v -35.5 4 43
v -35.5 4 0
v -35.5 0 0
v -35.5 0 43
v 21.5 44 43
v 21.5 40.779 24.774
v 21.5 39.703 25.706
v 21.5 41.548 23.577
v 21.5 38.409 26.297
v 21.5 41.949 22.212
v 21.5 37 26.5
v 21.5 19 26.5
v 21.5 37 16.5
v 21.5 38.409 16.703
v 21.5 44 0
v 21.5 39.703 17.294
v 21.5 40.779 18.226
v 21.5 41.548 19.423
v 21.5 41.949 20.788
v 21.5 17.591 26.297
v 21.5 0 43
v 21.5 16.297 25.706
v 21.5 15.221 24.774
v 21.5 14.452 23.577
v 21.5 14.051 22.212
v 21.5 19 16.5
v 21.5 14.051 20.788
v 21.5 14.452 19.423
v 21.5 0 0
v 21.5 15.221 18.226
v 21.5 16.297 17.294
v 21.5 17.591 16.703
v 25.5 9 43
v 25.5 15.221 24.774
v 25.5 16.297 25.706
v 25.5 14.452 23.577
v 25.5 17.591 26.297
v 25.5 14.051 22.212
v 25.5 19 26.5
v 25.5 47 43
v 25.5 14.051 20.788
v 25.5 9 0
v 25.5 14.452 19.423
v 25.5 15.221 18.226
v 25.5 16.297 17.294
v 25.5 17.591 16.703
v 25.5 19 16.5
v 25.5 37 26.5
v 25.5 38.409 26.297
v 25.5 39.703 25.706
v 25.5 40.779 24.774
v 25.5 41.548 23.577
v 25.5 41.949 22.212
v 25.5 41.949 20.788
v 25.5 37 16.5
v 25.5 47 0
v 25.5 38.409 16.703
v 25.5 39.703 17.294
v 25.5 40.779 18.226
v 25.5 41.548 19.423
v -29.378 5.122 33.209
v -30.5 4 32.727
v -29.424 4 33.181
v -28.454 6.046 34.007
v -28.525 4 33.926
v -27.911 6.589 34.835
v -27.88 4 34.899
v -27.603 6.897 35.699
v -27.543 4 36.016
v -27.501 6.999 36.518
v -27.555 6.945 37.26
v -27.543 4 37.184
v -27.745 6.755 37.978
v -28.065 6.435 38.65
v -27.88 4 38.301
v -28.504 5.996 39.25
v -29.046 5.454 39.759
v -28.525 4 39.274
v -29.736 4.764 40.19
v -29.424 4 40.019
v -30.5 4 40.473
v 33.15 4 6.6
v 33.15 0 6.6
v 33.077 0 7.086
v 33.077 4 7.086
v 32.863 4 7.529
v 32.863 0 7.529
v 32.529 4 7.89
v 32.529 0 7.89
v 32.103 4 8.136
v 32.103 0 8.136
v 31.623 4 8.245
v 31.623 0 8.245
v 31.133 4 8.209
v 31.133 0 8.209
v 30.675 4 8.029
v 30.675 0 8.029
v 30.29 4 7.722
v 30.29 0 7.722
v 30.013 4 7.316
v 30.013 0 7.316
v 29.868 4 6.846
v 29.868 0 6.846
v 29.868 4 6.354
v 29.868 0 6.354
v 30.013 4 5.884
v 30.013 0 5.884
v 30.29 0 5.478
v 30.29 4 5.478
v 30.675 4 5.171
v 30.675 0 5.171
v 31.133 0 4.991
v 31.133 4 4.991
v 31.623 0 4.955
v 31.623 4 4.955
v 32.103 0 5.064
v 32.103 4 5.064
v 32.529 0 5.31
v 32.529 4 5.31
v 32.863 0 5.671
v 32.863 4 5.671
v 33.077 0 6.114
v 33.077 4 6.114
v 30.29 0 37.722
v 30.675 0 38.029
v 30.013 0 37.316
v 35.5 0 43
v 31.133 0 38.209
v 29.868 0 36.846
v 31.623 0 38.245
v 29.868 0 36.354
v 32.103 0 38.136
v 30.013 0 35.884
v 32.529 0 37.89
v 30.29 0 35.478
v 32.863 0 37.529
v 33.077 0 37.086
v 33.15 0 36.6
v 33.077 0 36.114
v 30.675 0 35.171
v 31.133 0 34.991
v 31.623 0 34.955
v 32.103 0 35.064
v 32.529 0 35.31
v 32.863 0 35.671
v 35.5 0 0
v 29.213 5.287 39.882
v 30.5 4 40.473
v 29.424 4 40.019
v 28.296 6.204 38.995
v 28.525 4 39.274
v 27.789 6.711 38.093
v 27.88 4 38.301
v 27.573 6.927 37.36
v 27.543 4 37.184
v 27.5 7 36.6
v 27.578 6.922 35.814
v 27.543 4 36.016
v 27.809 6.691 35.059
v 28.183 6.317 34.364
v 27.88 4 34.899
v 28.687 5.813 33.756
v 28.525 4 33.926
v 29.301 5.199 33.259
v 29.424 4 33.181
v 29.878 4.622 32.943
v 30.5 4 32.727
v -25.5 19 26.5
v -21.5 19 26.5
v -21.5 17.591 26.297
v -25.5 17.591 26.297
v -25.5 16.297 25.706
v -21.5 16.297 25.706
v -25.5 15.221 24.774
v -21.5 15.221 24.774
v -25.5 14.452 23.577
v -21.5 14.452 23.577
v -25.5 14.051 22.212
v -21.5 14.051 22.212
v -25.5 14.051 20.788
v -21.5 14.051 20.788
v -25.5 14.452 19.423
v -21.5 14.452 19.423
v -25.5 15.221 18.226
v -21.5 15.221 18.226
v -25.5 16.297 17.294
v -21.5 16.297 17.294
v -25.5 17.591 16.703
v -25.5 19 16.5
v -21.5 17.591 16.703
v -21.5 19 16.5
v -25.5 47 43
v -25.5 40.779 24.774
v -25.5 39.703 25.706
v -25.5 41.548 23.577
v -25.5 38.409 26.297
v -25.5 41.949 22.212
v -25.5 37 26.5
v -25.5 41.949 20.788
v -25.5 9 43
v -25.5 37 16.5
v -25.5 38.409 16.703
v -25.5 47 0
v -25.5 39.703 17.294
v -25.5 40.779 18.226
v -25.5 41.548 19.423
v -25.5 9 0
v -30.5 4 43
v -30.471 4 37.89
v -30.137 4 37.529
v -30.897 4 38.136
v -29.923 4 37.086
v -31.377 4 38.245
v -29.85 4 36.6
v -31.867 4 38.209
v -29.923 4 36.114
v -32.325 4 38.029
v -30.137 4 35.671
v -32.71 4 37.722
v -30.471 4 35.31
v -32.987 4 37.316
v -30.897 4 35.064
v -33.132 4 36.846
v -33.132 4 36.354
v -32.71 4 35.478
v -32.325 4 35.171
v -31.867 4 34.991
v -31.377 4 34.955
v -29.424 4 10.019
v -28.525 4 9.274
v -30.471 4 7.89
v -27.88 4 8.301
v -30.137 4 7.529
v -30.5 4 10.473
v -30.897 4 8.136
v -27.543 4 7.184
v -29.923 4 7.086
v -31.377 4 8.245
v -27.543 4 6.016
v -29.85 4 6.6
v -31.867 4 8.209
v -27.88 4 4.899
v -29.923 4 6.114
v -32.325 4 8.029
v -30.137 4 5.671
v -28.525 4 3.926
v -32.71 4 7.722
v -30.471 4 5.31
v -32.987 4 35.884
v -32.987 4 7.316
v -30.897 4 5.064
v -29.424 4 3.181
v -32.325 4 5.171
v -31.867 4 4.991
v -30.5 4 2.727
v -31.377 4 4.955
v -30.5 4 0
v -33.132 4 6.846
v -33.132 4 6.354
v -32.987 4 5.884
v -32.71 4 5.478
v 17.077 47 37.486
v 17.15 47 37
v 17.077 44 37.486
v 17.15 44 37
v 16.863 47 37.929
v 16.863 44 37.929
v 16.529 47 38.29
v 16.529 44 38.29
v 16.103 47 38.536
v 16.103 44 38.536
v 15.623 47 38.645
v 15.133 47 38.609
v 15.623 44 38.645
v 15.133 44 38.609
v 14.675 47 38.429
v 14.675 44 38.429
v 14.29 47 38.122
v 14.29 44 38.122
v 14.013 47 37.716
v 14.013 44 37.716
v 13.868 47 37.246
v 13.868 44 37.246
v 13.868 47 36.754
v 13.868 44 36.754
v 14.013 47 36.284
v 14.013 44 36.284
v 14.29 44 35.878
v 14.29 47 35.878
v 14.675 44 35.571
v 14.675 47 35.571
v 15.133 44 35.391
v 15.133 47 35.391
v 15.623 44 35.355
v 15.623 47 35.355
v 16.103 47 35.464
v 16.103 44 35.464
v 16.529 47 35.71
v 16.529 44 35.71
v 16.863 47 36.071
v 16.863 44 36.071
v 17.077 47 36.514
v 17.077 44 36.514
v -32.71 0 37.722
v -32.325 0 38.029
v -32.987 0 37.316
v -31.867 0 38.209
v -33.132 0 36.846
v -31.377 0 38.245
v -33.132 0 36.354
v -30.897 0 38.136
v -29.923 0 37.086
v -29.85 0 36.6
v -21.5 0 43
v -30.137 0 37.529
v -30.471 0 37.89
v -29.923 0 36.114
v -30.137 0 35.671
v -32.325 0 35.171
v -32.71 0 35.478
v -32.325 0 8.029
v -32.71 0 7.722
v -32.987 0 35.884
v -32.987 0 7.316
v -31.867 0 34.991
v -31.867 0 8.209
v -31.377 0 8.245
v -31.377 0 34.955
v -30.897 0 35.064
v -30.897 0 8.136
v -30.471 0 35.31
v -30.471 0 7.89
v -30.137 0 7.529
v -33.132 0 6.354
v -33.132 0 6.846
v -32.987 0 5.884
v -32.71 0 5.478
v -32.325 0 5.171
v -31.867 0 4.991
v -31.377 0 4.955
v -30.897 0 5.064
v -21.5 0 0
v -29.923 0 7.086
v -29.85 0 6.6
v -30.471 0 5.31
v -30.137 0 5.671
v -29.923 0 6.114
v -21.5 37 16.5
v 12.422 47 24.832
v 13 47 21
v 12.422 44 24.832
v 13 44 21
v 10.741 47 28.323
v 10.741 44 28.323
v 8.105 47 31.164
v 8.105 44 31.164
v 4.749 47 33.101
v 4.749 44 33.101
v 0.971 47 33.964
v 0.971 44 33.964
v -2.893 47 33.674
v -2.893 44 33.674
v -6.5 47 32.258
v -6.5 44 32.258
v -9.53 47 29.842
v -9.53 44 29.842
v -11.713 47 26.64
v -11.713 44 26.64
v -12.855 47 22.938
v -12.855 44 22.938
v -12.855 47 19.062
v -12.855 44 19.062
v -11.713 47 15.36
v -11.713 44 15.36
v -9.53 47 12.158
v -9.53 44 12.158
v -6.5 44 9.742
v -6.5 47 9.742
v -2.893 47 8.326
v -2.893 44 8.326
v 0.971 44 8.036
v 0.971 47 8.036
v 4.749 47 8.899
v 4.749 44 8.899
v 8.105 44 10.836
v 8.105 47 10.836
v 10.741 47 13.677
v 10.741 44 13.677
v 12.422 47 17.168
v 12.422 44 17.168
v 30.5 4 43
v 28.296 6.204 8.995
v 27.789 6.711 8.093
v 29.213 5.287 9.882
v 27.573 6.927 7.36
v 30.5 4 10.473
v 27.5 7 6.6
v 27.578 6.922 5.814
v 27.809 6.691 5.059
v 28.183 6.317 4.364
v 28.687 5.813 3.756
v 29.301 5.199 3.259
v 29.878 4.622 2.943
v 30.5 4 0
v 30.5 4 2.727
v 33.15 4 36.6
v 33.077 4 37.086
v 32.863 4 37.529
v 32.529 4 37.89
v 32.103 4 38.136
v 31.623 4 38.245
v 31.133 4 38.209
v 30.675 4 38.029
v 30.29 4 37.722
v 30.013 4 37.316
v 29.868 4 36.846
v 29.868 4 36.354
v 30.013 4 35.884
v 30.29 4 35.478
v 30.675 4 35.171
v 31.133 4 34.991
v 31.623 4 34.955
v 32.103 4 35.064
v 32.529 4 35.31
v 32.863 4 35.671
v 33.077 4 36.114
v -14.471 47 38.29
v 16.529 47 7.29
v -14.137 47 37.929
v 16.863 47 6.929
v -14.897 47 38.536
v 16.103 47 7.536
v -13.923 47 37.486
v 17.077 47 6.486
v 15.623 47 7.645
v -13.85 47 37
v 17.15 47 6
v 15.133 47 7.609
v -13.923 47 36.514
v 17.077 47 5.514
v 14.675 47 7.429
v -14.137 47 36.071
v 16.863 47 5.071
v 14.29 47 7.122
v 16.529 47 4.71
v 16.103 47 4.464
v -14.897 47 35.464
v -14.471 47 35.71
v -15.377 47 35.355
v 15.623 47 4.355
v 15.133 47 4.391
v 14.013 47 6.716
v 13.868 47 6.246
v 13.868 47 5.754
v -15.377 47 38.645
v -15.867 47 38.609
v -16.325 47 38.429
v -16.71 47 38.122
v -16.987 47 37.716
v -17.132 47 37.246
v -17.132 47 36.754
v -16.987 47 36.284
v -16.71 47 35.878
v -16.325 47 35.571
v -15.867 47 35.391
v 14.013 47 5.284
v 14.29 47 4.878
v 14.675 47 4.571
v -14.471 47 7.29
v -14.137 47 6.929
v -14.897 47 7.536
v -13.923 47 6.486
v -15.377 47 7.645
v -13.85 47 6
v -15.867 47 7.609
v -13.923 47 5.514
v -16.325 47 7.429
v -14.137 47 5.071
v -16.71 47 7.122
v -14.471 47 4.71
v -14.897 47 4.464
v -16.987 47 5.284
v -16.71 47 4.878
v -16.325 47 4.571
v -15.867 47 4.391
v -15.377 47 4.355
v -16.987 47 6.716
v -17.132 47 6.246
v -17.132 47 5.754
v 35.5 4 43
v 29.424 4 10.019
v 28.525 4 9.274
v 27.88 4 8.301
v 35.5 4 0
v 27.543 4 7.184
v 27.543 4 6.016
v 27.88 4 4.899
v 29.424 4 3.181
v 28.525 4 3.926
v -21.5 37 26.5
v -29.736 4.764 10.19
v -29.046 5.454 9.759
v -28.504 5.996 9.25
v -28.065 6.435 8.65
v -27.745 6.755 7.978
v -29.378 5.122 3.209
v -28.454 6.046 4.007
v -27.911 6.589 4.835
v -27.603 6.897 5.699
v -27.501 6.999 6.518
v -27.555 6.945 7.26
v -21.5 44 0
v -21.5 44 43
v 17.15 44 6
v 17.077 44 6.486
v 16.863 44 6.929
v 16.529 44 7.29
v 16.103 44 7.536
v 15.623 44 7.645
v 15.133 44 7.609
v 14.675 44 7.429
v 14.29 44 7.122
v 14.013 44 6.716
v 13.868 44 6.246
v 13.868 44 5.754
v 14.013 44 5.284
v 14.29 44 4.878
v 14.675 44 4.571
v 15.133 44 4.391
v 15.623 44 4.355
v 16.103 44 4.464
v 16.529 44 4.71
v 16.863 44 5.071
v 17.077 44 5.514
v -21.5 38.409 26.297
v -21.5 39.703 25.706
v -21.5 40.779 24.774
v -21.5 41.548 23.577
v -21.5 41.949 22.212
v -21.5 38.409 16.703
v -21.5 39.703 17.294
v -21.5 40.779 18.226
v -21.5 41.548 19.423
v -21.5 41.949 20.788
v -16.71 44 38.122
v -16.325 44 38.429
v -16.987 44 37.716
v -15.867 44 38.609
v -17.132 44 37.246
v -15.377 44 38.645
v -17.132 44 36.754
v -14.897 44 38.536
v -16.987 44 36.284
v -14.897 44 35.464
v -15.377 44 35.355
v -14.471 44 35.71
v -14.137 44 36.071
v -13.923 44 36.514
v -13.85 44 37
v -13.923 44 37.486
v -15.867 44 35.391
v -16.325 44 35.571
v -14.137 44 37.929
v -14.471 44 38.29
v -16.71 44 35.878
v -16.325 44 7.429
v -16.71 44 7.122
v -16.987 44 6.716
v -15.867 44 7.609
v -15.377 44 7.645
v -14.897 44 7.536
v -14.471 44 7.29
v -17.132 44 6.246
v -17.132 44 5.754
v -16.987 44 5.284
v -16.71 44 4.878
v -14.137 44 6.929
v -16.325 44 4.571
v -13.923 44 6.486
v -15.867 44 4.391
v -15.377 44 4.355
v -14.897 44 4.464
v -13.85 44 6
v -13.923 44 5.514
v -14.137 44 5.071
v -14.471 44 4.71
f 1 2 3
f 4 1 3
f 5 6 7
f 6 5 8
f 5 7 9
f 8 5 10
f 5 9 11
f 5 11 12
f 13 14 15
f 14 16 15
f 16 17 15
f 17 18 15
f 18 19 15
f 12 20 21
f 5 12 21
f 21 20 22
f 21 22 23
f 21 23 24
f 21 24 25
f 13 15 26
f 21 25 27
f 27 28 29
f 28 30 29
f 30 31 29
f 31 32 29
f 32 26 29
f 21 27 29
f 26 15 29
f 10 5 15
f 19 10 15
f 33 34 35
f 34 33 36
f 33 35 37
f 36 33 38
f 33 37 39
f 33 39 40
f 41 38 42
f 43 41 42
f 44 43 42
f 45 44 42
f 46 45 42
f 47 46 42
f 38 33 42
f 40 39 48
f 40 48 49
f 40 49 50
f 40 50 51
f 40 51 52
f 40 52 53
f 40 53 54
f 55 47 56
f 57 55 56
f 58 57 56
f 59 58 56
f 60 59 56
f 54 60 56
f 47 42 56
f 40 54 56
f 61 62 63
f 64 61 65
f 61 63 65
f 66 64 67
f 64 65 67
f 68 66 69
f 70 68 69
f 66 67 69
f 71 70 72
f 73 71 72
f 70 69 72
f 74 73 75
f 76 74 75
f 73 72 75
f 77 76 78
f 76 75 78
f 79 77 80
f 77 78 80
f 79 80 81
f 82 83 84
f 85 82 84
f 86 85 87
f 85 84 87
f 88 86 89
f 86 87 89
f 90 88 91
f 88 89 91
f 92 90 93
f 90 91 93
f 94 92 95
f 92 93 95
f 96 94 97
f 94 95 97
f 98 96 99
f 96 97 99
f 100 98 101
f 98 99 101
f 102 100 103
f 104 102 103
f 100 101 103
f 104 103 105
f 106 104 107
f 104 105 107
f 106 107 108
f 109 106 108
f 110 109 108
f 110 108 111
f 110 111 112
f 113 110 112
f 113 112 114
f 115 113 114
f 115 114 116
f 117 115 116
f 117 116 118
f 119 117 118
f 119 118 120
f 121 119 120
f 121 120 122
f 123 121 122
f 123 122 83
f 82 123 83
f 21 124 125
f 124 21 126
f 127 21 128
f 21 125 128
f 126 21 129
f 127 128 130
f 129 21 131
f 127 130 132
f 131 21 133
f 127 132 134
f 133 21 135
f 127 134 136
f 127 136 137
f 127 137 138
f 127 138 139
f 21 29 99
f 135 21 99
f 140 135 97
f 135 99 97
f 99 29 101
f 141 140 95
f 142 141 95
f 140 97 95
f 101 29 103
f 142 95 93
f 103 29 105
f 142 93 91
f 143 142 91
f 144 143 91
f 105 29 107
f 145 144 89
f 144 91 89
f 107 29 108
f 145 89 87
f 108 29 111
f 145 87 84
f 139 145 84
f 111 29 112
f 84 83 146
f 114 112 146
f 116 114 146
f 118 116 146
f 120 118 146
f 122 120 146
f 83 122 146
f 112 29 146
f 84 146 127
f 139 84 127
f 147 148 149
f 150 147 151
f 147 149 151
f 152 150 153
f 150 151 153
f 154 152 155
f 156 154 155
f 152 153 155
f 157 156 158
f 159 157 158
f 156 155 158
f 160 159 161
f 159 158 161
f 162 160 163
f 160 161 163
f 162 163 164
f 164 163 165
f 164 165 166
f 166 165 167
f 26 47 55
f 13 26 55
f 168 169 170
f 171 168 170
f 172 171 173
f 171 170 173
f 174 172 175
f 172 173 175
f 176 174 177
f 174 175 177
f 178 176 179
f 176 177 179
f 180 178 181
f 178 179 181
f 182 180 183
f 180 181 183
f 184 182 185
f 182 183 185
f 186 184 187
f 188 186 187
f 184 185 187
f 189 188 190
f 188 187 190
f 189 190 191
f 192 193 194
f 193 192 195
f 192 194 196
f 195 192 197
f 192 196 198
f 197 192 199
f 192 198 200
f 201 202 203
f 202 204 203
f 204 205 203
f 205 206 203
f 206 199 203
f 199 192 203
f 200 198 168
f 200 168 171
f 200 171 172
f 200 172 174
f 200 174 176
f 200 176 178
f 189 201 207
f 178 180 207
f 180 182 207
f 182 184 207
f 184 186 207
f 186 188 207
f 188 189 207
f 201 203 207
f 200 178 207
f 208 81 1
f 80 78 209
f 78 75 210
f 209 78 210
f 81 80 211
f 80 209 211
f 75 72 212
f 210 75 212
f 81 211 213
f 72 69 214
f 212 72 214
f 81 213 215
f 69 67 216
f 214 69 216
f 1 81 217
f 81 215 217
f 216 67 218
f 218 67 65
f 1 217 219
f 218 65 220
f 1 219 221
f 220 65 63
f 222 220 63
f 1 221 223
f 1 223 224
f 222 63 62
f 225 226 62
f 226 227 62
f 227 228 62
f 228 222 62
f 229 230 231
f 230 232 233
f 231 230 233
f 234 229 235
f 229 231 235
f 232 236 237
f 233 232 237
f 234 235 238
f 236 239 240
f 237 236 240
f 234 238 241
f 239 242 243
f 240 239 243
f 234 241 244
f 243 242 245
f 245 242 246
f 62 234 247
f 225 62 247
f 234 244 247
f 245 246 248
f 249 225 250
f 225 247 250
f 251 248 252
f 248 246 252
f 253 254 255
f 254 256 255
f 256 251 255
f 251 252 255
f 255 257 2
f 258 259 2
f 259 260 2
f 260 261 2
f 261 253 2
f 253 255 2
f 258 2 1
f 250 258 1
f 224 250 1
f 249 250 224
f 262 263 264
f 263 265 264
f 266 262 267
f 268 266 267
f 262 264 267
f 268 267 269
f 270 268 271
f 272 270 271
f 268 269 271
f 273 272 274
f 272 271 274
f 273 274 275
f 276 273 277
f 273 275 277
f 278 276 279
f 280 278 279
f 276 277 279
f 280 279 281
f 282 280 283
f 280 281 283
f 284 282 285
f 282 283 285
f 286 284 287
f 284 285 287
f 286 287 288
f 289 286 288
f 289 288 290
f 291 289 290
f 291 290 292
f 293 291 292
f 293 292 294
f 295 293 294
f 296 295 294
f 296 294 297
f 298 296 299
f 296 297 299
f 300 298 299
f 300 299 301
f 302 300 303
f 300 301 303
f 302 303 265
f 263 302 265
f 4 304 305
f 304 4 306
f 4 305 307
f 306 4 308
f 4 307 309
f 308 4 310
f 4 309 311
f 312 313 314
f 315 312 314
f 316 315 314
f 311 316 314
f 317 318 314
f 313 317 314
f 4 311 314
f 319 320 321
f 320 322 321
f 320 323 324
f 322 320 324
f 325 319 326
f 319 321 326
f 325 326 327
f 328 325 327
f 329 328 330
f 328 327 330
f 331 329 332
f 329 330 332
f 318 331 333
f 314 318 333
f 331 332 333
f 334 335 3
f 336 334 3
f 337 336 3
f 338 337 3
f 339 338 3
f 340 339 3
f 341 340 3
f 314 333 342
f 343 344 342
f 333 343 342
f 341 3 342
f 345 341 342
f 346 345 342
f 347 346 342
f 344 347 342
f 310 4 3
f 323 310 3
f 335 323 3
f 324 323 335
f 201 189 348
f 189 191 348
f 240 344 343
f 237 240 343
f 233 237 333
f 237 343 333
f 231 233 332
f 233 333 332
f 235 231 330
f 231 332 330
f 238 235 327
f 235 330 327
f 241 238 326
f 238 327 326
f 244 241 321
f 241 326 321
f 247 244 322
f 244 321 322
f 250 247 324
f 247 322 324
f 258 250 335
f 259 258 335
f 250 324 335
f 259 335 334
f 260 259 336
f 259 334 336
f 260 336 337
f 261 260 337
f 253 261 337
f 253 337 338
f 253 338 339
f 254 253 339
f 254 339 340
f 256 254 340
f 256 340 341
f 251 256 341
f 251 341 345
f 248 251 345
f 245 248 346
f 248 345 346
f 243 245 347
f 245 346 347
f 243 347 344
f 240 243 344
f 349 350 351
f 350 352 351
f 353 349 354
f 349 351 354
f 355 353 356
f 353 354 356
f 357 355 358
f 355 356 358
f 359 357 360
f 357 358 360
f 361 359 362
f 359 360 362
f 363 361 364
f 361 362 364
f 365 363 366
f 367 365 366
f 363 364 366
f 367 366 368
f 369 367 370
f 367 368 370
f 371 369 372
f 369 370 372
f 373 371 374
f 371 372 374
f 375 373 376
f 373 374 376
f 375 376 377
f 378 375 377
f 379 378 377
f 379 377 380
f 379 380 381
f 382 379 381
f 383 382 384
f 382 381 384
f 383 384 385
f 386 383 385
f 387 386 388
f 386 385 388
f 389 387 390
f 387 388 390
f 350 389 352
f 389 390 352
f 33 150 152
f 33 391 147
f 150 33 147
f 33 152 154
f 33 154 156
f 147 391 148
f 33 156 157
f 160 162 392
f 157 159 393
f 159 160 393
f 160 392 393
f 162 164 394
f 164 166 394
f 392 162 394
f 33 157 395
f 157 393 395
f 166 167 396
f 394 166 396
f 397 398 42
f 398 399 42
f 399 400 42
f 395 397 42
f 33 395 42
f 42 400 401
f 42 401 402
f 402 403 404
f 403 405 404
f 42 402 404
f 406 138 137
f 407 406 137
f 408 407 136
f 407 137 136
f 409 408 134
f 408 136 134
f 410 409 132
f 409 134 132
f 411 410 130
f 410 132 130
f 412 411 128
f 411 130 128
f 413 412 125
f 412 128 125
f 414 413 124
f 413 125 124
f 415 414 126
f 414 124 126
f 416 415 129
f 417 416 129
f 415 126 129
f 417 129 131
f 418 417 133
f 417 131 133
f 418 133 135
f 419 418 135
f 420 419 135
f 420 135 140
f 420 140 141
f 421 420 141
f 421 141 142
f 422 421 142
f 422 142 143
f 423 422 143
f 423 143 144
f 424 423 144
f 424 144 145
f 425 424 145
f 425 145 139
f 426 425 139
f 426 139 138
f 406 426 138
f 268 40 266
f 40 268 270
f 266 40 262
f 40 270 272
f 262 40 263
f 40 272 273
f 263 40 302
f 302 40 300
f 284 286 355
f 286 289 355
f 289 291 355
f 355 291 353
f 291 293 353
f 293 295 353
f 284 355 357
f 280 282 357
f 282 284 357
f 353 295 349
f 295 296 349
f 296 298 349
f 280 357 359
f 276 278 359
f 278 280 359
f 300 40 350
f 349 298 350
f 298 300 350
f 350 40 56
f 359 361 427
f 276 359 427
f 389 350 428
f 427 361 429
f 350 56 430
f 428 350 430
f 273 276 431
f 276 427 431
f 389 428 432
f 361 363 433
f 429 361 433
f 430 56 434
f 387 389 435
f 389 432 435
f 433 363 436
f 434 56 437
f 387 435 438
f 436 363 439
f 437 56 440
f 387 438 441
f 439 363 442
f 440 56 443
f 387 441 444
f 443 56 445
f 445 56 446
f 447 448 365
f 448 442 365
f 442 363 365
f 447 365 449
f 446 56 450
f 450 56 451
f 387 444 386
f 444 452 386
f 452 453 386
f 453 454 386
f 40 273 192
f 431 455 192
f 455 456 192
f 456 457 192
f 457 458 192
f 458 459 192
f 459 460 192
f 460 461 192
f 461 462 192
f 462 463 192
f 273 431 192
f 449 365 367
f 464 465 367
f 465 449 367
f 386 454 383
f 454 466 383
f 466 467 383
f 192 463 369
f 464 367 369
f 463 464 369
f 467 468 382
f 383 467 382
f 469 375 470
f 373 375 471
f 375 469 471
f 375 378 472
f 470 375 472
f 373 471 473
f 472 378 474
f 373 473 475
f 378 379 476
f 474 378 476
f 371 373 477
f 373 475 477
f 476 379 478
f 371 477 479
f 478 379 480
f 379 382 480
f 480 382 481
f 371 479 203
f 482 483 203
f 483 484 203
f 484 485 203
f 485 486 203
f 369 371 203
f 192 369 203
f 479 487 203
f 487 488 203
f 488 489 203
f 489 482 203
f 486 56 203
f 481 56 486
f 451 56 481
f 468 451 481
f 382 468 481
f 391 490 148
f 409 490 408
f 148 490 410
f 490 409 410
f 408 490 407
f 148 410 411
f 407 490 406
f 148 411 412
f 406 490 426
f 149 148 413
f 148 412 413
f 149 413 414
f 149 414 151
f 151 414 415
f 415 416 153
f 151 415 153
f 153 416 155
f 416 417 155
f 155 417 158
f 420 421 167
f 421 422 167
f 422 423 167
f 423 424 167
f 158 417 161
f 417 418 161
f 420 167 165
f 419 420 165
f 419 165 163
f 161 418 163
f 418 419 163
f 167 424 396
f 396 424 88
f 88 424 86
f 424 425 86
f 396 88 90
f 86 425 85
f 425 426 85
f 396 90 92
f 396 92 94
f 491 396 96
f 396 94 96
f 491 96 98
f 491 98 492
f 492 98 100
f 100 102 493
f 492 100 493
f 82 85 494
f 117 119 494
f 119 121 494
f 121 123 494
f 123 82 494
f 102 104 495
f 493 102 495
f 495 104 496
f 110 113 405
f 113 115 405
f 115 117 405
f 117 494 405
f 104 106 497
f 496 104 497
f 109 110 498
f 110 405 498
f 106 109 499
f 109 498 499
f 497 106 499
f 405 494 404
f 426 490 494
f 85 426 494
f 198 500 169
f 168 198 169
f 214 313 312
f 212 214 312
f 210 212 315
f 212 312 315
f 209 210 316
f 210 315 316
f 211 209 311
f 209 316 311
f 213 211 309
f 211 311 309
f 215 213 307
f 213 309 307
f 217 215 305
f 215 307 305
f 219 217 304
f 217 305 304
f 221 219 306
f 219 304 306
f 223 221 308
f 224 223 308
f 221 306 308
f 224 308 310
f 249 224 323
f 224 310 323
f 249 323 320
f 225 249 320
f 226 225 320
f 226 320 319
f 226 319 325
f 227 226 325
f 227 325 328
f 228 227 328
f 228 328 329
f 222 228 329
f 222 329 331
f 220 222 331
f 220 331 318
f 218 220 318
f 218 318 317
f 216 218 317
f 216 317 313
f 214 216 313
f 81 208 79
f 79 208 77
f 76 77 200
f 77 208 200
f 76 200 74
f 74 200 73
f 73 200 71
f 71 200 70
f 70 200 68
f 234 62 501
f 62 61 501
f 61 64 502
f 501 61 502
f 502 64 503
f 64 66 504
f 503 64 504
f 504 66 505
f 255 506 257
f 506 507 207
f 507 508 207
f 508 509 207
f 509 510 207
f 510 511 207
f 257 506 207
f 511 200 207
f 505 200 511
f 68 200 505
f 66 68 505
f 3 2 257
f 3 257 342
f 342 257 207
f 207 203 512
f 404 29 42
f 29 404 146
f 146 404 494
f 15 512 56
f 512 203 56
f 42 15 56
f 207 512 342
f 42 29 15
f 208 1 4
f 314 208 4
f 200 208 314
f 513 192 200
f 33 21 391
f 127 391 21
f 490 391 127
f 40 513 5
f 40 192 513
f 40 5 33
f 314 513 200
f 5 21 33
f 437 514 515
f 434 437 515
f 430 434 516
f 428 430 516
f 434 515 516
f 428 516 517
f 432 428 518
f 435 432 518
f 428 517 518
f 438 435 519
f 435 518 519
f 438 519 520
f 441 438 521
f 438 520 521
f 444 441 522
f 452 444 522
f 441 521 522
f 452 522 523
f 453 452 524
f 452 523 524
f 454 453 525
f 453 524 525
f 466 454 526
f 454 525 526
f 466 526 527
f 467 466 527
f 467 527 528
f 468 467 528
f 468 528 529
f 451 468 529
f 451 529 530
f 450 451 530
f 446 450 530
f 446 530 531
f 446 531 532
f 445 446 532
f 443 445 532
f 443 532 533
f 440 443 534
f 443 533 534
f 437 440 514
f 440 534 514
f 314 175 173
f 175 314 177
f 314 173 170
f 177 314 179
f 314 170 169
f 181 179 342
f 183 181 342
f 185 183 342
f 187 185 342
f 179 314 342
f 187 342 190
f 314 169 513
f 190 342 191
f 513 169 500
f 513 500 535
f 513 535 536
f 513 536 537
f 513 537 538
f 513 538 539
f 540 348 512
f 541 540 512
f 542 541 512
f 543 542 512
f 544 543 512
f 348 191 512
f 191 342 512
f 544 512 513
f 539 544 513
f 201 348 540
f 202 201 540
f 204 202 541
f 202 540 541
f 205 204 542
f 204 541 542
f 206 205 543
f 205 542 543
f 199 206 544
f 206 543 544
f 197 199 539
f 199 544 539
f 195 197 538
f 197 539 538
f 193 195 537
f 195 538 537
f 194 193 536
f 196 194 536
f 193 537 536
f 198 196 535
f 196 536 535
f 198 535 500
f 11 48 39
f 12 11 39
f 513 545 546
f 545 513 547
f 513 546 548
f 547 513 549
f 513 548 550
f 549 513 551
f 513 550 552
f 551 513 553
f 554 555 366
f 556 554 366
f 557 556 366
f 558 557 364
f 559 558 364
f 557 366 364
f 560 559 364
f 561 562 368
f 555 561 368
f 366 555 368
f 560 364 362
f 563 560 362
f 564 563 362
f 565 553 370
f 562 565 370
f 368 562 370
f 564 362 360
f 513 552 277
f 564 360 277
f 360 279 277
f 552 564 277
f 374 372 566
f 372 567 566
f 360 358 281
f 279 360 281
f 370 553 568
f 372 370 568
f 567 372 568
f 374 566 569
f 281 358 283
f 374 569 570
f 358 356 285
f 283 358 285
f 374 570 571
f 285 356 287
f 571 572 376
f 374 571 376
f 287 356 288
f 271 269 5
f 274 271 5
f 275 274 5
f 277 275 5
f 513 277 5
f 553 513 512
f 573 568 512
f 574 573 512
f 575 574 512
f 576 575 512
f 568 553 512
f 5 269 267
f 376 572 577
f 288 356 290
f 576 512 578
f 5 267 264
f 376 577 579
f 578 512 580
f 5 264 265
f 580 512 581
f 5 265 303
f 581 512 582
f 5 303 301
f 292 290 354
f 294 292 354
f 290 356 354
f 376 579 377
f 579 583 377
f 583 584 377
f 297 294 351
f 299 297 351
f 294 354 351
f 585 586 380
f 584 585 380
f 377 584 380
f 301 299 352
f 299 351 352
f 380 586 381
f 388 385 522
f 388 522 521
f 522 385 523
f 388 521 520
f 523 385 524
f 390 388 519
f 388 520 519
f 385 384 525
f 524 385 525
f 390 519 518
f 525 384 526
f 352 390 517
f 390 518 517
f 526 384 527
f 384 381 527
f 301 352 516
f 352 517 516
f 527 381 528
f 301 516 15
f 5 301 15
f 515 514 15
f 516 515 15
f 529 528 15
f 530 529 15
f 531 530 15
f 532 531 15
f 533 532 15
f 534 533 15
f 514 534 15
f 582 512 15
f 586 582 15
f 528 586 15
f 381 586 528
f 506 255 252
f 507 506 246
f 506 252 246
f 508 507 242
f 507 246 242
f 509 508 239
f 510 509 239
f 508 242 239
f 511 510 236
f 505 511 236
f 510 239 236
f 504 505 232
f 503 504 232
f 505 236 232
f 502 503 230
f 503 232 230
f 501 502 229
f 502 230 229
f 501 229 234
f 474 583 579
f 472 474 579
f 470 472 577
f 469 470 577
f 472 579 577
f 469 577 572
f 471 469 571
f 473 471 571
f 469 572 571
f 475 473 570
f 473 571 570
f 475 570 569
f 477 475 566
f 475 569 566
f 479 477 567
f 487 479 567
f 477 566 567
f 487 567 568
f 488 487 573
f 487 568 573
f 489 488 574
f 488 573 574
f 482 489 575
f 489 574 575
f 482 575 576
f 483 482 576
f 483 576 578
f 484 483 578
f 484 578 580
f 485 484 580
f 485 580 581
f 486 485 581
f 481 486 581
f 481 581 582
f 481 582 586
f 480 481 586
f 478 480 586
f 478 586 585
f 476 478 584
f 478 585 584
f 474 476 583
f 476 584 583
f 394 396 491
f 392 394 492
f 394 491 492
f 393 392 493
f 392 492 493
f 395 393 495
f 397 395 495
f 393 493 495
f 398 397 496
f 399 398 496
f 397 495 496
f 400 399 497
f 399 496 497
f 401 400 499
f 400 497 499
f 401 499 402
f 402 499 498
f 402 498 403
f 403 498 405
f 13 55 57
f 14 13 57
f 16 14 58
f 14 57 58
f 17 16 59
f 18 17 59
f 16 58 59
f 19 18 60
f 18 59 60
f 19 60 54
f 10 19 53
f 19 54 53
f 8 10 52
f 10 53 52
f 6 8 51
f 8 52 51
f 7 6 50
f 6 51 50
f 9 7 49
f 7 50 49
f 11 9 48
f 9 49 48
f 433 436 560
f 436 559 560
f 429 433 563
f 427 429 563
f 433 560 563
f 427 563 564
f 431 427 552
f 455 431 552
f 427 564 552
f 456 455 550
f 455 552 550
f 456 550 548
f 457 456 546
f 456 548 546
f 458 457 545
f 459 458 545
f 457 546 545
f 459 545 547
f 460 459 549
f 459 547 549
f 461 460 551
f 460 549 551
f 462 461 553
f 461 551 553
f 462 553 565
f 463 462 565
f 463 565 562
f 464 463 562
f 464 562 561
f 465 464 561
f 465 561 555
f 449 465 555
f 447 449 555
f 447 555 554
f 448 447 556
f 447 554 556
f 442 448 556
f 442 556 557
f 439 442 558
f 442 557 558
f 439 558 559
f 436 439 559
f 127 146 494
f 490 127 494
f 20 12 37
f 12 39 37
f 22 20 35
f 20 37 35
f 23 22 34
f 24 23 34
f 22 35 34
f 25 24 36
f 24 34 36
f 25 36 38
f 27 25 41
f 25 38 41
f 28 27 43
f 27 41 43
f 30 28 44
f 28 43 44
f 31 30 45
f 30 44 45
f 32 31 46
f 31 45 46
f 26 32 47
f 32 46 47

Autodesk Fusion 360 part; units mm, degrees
sketch "Sketch1" plane through (0, 0, 0) normal (0, 0, 1) x (1, 0, 0)
  line L0 (-35.5, 0) -> (-21.5, 0)
  line L1 (-21.5, 0) -> (-21.5, 44)
  line L2 (-21.5, 44) -> (21.5, 44)
  line L3 (21.5, 44) -> (21.5, 0)
  line L4 (21.5, 0) -> (35.5, 0)
  line L5 (35.5, 0) -> (35.5, 4)
  line L6 (35.5, 4) -> (25.5, 4)
  line L7 (25.5, 4) -> (25.5, 47)
  line L8 (25.5, 47) -> (-25.5, 47)
  line L9 (-25.5, 47) -> (-25.5, 4)
  line L10 (-25.5, 4) -> (-35.5, 4)
  line L11 (-35.5, 4) -> (-35.5, 0)
  dimension "d1" = 43
  dimension "d2" = 21.5
  dimension "d3" = 4
  dimension "d4" = 4
  dimension "d5" = 3
  dimension "d6" = 4
  dimension "d7" = 4
  dimension "d8" = 10
  dimension "d9" = 10
  dimension "d42" = 44
  dimension "d43" = 44
extrude "Extrude1" add sketch "Sketch1" along normal blind 43
sketch "Sketch3" plane through (0, 44, 0) normal (0, -1, 0) x (1, 0, 0)
  line L0 (-21.5, 0) -> (21.5, 0)
  line L1 (21.5, 0) -> (21.5, 43)
  line L2 (21.5, 43) -> (-21.5, 43)
  line L3 (-21.5, 43) -> (-21.5, 0)
  circle A0 centre (-15.5, 6) radius 1.65
  circle A1 centre (15.5, 6) radius 1.65
  circle A2 centre (-15.5, 37) radius 1.65
  circle A3 centre (15.5, 37) radius 1.65
  dimension "d14" = 3.3
  dimension "d15" = 6
  dimension "d16" = 6
  dimension "d19" = 31
  dimension "d20" = 31
extrude "Extrude2" cut sketch "Sketch3" against normal up to surface (3 mm away) contours A0 | A1 | A2 | A3
chamfer "Chamfer1" distance 5 angle 45 2 edges at (25.5, 4, 21.5) (-25.5, 4, 21.5)
sketch "Sketch5" plane through (0, 44, 0) normal (0, -1, 0) x (1, 0, 0)
  circle A0 centre (15.5, 37) radius 1.65
  circle A1 centre (15.5, 6) radius 1.65
  circle A2 centre (-15.5, 37) radius 1.65
  circle A3 centre (-15.5, 6) radius 1.65
  line L0 (-21.5, 0) -> (21.5, 0)
  line L1 (21.5, 0) -> (21.5, 43)
  line L2 (21.5, 43) -> (-21.5, 43)
  line L3 (-21.5, 43) -> (-21.5, 0)
  circle A4 centre (0, 21) radius 13
  dimension "d25" = 26
  dimension "d26" = 21.5
extrude "Extrude3" cut sketch "Sketch5" against normal up to surface (3 mm away) contours A4
sketch "Sketch6" plane through (0, 0, 0) normal (0, -1, 0) x (1, 0, 0)
  line L0 (21.5, 0) -> (35.5, 0)
  line L1 (35.5, 0) -> (35.5, 43)
  line L2 (35.5, 43) -> (21.5, 43)
  line L3 (21.5, 43) -> (21.5, 0)
  circle A0 centre (31.5, 36.6) radius 1.65
  circle A1 centre (-31.5, 36.6) radius 1.65
  line L4 (-21.5, 0) -> (-21.5, 43)
  line L5 (-35.5, 43) -> (-21.5, 43)
  circle A2 centre (31.5, 6.6) radius 1.65
  circle A3 centre (-31.5, 6.6) radius 1.65
  dimension "d29" = 3.3
  dimension "d30" = 10
  dimension "d31" = 3.3
  dimension "d32" = 10
  dimension "d33" = 6.4
  dimension "d34" = 6.4
  dimension "d37" = 0
  dimension "d38" = -30
extrude "Extrude4" cut sketch "Sketch6" against normal blind 10 contours A0 | A1 | A2 | A3
sketch "Sketch7" plane through (0, 4, 0) normal (0, 1, 0) x (-1, 0, 0)
  arc A0 (-30.5, 7.9124) -> (-30.5, 5.2876) centre (-31.5, 6.6) ccw
  line L0 (-30.5, 7.9124) -> (-30.5, 35.2876)
  arc A1 (-30.5, 37.9124) -> (-30.5, 35.2876) centre (-31.5, 36.6) ccw
  line L1 (-30.5, 37.9124) -> (-30.5, 43)
  line L2 (-30.5, 43) -> (-35.5, 43)
  line L3 (-35.5, 43) -> (-35.5, 0)
  line L4 (-35.5, 0) -> (-30.5, 0)
  line L5 (-30.5, 0) -> (-30.5, 5.2876)
  circle A2 centre (-31.5, 6.6) radius 4
  circle A3 centre (31.5, 6.6) radius 4
  circle A4 centre (-31.5, 36.6) radius 4
  circle A5 centre (31.5, 36.6) radius 4
  dimension "d44" = 8
  dimension "d47" = 63
  dimension "d48" = 30
extrude "Extrude5" cut sketch "Sketch7" along normal blind 4 contours A0 L0 L5 A2 | A0 L0 L5 A2 | L0 A1 L1 A4 | L0 A1 L1 A4 | A3 | A5
sketch "Sketch8" plane through (25.5, 0, 0) normal (1, 0, 0) x (0, 0, -1)
  line L0 (-43, 9) -> (0, 9)
  line L1 (0, 9) -> (0, 47)
  line L2 (0, 47) -> (-43, 47)
  line L3 (-43, 47) -> (-43, 9)
  line L4 (-26.5, 37) -> (-26.5, 19)
  arc A0 (-26.5, 19) -> (-16.5, 19) centre (-21.5, 19) ccw
  line L5 (-16.5, 19) -> (-16.5, 37)
  arc A1 (-16.5, 37) -> (-26.5, 37) centre (-21.5, 37) ccw
  line L6 (-21.5, 37) -> (-21.5, 19) construction
  dimension "d51" = 18
  dimension "d52" = 10
  dimension "d53" = 21.5
extrude "Extrude6" cut sketch "Sketch8" against normal up to surface (51 mm away) contours L4 A0 L5 A1
equation "d1 = size"
equation "d2 = d1 / 2"
equation "d4 = d3"
equation "d7 = d6"
equation "d9 = d8"
equation "d10 = size"
equation "size = 43 mm"
equation "spacing = 31 mm"
equation "d15 = ( size - spacing ) / 2"
equation "d16 = d15"
equation "d26 = size / 2"
equation "d32 = d30"
equation "d34 = d33"
equation "d38 = -( size - 13 mm )"
equation "d43 = d42"
equation "d53 = ( 43 / 2 ) * 1 mm"
